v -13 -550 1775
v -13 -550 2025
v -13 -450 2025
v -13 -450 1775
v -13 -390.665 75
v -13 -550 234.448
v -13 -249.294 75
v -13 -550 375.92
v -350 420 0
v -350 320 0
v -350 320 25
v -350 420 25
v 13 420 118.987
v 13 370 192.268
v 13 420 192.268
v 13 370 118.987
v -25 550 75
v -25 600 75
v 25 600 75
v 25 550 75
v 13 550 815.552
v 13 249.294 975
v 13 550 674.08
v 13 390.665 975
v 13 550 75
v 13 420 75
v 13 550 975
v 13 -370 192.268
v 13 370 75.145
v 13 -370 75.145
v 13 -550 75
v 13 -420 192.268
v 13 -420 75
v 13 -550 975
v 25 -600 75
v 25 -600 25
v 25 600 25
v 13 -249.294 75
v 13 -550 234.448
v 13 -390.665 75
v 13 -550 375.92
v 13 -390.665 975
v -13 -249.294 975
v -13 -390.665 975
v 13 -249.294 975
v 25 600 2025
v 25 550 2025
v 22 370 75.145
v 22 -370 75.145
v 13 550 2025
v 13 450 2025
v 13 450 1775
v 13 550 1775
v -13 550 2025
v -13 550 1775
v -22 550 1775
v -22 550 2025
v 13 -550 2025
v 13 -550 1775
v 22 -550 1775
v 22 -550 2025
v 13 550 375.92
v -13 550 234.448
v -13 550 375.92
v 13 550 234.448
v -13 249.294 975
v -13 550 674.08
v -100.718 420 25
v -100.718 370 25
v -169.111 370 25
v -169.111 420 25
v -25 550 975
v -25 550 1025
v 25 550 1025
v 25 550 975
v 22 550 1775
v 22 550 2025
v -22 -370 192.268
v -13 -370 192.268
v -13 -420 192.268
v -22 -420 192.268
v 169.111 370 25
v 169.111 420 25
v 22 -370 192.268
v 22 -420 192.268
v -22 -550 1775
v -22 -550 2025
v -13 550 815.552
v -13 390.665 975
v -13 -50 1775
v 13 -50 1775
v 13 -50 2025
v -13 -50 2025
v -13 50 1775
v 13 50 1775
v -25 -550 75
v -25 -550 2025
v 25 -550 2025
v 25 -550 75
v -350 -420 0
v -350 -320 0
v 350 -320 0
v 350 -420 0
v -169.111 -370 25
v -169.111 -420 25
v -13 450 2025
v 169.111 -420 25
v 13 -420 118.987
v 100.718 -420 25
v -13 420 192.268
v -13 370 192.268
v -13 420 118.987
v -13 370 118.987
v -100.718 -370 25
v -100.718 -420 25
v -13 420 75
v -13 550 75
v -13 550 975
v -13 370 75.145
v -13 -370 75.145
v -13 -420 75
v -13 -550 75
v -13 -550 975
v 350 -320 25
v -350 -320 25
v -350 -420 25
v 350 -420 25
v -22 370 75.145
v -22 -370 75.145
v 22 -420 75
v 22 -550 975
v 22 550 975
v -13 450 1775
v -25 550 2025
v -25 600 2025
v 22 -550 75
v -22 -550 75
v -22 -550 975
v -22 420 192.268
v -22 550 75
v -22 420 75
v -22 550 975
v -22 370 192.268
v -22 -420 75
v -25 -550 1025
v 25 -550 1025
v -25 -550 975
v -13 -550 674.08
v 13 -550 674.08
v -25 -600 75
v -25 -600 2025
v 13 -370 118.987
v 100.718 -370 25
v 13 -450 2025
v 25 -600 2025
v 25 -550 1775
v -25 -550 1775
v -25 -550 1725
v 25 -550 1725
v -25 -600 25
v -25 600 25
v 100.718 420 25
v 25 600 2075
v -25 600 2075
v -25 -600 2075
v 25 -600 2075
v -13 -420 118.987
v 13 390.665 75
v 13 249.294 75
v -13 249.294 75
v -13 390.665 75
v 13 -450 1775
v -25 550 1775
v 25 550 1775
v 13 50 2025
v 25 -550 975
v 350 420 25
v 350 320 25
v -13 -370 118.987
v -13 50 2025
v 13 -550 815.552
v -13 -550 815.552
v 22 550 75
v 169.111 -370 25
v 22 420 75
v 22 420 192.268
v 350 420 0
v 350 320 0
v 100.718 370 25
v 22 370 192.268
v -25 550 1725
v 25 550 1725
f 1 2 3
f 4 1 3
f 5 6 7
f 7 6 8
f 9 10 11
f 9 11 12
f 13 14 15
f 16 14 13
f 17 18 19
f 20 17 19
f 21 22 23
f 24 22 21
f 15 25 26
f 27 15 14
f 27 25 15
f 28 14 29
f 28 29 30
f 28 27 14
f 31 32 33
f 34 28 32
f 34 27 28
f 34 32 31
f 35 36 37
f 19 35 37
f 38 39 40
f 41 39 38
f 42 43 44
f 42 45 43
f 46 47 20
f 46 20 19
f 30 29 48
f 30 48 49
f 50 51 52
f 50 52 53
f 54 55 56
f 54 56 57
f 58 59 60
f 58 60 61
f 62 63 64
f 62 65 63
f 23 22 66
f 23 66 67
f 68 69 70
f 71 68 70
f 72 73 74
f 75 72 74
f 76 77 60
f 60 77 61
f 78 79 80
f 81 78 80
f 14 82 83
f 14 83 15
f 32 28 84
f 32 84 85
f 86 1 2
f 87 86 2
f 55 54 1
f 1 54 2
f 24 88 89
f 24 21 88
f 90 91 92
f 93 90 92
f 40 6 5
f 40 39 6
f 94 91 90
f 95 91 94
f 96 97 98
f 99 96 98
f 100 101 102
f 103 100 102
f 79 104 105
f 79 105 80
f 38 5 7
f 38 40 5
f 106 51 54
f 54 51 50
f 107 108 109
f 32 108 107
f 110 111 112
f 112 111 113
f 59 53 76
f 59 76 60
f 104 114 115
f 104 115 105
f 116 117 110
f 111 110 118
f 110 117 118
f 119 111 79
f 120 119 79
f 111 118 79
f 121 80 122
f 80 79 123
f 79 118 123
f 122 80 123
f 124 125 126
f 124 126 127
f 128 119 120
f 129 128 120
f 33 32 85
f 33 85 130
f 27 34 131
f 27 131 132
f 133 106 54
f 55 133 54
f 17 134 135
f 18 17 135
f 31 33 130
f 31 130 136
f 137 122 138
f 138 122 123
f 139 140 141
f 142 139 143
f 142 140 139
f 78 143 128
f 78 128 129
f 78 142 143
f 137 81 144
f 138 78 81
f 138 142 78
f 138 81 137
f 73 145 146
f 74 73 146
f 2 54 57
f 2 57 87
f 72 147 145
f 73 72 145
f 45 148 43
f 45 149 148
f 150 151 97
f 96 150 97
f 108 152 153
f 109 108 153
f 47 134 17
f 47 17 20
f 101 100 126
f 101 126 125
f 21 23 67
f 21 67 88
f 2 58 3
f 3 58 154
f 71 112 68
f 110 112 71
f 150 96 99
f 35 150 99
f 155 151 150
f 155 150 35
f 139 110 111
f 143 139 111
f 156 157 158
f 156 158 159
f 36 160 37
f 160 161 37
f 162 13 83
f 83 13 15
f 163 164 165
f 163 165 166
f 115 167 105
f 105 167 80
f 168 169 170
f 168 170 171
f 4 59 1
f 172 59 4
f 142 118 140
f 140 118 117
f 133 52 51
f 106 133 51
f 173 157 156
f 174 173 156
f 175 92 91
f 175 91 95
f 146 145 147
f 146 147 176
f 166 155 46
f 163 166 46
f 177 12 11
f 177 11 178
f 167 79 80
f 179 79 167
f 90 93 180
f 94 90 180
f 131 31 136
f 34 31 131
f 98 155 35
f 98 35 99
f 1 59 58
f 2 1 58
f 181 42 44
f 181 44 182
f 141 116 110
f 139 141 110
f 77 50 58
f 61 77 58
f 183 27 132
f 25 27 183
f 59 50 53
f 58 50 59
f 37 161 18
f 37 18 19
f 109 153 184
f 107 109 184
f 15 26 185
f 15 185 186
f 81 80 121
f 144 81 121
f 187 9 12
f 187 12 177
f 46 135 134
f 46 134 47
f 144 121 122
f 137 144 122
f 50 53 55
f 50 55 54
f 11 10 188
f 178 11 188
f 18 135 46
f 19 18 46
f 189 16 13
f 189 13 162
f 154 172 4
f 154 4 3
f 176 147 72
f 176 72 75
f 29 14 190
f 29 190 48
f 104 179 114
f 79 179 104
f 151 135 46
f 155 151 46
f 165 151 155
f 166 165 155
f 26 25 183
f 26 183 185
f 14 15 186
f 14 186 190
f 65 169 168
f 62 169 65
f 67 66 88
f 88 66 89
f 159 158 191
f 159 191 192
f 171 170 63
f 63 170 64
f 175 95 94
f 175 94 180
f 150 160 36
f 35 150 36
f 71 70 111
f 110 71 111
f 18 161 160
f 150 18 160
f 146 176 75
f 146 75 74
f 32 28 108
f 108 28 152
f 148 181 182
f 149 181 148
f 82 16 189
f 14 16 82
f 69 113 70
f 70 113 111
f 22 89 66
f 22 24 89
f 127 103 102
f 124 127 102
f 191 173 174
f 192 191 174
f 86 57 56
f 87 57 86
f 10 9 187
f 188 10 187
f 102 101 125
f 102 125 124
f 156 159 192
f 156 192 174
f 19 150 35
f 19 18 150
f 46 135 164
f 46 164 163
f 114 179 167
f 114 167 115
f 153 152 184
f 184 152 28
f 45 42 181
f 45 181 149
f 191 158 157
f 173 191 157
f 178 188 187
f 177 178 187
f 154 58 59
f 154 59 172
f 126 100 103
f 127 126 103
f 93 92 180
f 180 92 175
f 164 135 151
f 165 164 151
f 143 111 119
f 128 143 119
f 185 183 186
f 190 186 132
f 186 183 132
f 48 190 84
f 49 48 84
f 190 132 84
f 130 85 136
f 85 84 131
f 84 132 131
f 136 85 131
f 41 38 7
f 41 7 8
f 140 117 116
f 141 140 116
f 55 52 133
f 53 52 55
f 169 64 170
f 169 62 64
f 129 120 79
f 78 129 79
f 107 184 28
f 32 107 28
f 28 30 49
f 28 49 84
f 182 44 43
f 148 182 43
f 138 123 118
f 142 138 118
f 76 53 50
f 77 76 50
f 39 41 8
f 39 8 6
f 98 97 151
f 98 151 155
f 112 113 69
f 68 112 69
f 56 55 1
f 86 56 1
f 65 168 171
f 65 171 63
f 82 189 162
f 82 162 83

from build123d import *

# Parameters (mm, degrees)
F0_W           = 700
F0_H           = 100
F1_DEPTH       = 25
F3_W           = 50
F3_H           = 180
F3_H_2         = 100
F3_H_3         = 920
F4_DEPTH       = 50
F7_W           = 50
F7_H           = 50
F8_DEPTH       = 1950
F9_W           = 50
F9_H           = 1150
F9_H_2         = 50
F10_DEPTH      = 50
F11_W          = 50
F11_H          = 50
F12_DEPTH      = 1100
F14_DEPTH      = 13
F14_DEPTH_BACK = 13
F13_W          = 100
F13_H          = 250
F17_DEPTH      = 50
F21_DEPTH      = 9
F20_W          = 1100
F20_H          = 250


with BuildPart() as f1:
    # F0 (on Top) → F1 (new body)
    with BuildSketch(Plane.XY):
        with Locations((0, 370)):
            Rectangle(F0_W, F0_H)
    extrude(amount=F1_DEPTH)


with BuildPart() as f1b:
    # F0 (on Top) → F1, piece 2 (new body)
    with BuildSketch(Plane.XY):
        with Locations((0, -370)):
            Rectangle(F0_W, F0_H)
    extrude(amount=F1_DEPTH)


with BuildPart() as f4:
    # F3 (on face) → F4 (new body)
    with BuildSketch(Plane.XY.offset(25)):
        with Locations((0, -510)):
            Rectangle(F3_W, F3_H)
        with Locations((0, -370)):
            Rectangle(F3_W, F3_H_2)
        with Locations((0, 140)):
            Rectangle(F3_W, F3_H_3)
    extrude(amount=F4_DEPTH)


with BuildPart() as f8:
    # F7 (on face) → F8 (new body)
    with BuildSketch(Plane.XY.offset(75)):
        with Locations((0, -575)):
            Rectangle(F7_W, F7_H)
    extrude(amount=F8_DEPTH)


with BuildPart() as f8b:
    # F7 (on face) → F8, piece 2 (new body)
    with BuildSketch(Plane.XY.offset(75)):
        with Locations((0, 575)):
            Rectangle(F7_W, F7_H)
    extrude(amount=F8_DEPTH)


with BuildPart() as f10:
    # F9 (on face) → F10 (new body)
    with BuildSketch(Plane.XY.offset(2025)):
        with Locations((0, 25)):
            Rectangle(F9_W, F9_H)
        with Locations((0, -575)):
            Rectangle(F9_W, F9_H_2)
    extrude(amount=F10_DEPTH)


with BuildPart() as f12:
    # F11 (on face) → F12 (new body)
    with BuildSketch(Plane.XZ.offset(-550)):
        with Locations((0, 1000)):
            Rectangle(F11_W, F11_H)
    extrude(amount=F12_DEPTH)


with BuildPart() as f12b:
    # F11 (on face) → F12, piece 2 (new body)
    with BuildSketch(Plane.XZ.offset(-550)):
        with Locations((0, 1750)):
            Rectangle(F11_W, F11_H)
    extrude(amount=F12_DEPTH)


with BuildPart() as f14:
    # F13 (on Right) → F14 (new body, two sides)
    with BuildSketch(Plane.YZ) as f14_sk:
        Polygon((-249.2936508852, 975), (-390.6649114874, 975), (-550, 815.5519290026), (-550, 674.0804238375), align=None)
    extrude(amount=F14_DEPTH)
    extrude(f14_sk.sketch, amount=-F14_DEPTH_BACK)


with BuildPart() as f14b:
    # F13 (on Right) → F14, piece 2 (new body, two sides)
    with BuildSketch(Plane.YZ) as f14_2_sk:
        Polygon((390.6649114874, 975), (249.2936508852, 975), (550, 674.0804238375), (550, 815.5519290026), align=None)
    extrude(amount=F14_DEPTH)
    extrude(f14_2_sk.sketch, amount=-F14_DEPTH_BACK)


with BuildPart() as f14c:
    # F13 (on Right) → F14, piece 3 (new body, two sides)
    with BuildSketch(Plane.YZ) as f14_3_sk:
        Polygon((-390.6649114874, 75), (-249.2936508852, 75), (-550, 375.9195761625), (-550, 234.4480709974), align=None)
    extrude(amount=F14_DEPTH)
    extrude(f14_3_sk.sketch, amount=-F14_DEPTH_BACK)


with BuildPart() as f14d:
    # F13 (on Right) → F14, piece 4 (new body, two sides)
    with BuildSketch(Plane.YZ) as f14_4_sk:
        Polygon((550, 375.9195761625), (249.2936508852, 75), (390.6649114874, 75), (550, 234.4480709974), align=None)
    extrude(amount=F14_DEPTH)
    extrude(f14_4_sk.sketch, amount=-F14_DEPTH_BACK)


with BuildPart() as f14e:
    # F13 (on Right) → F14, piece 5 (new body, two sides)
    with BuildSketch(Plane.YZ) as f14_5_sk:
        with Locations((500, 1900)):
            Rectangle(F13_W, F13_H)
    extrude(amount=F14_DEPTH)
    extrude(f14_5_sk.sketch, amount=-F14_DEPTH_BACK)


with BuildPart() as f14f:
    # F13 (on Right) → F14, piece 6 (new body, two sides)
    with BuildSketch(Plane.YZ) as f14_6_sk:
        with Locations((-500, 1900)):
            Rectangle(F13_W, F13_H)
    extrude(amount=F14_DEPTH)
    extrude(f14_6_sk.sketch, amount=-F14_DEPTH_BACK)


with BuildPart() as f14g:
    # F13 (on Right) → F14, piece 7 (new body, two sides)
    with BuildSketch(Plane.YZ) as f14_7_sk:
        with Locations((0, 1900)):
            Rectangle(F13_W, F13_H)
    extrude(amount=F14_DEPTH)
    extrude(f14_7_sk.sketch, amount=-F14_DEPTH_BACK)


with BuildPart() as f17:
    # F16 (on offset) → F17 (new body)
    with BuildSketch(Plane.XZ.offset(-370)):
        Polygon((13, 118.9867779613), (100.7178681435, 25), (169.1110157222, 25), (13, 192.2677606344), align=None)
    extrude(amount=-F17_DEPTH)


with BuildPart() as f18_1:
    # F18: instance of F17
    add(f17.part.mirror(Plane.XZ))


with BuildPart() as f19_1:
    # F19: instance of F18_1
    add(f18_1.part.mirror(Plane.YZ))


with BuildPart() as f19_2:
    # F19: instance of F17
    add(f17.part.mirror(Plane.YZ))


with BuildPart() as f21:
    # F20 (on face) → F21 (new body)
    with BuildSketch(Plane(origin=(-13, 0, 0), x_dir=(0, -1, 0), z_dir=(-1, 0, 0))):
        Polygon((550, 75), (550, 975), (-550, 975), (-550, 75), (-420, 75), (-420, 192.2677606344), (-370, 192.2677606344), (-370, 75.1454979181), (370, 75.1454979181), (370, 192.2677606344), (420, 192.2677606344), (420, 75), align=None)
    extrude(amount=F21_DEPTH)


with BuildPart() as f21b:
    # F20 (on face) → F21, piece 2 (new body)
    with BuildSketch(Plane(origin=(-13, 0, 0), x_dir=(0, -1, 0), z_dir=(-1, 0, 0))):
        with Locations((0, 1900)):
            Rectangle(F20_W, F20_H)
    extrude(amount=F21_DEPTH)


with BuildPart() as f22_1:
    # F22: instance of F21
    add(f21.part.mirror(Plane.YZ))


with BuildPart() as f22_2:
    # F22: instance of F21b
    add(f21b.part.mirror(Plane.YZ))


solid = Compound([f1.part, f1b.part, f4.part, f8.part, f8b.part, f10.part, f12.part, f12b.part, f14.part, f14b.part, f14c.part, f14d.part, f14e.part, f14f.part, f14g.part, f17.part, f18_1.part, f19_1.part, f19_2.part, f21.part, f21b.part, f22_1.part, f22_2.part])
